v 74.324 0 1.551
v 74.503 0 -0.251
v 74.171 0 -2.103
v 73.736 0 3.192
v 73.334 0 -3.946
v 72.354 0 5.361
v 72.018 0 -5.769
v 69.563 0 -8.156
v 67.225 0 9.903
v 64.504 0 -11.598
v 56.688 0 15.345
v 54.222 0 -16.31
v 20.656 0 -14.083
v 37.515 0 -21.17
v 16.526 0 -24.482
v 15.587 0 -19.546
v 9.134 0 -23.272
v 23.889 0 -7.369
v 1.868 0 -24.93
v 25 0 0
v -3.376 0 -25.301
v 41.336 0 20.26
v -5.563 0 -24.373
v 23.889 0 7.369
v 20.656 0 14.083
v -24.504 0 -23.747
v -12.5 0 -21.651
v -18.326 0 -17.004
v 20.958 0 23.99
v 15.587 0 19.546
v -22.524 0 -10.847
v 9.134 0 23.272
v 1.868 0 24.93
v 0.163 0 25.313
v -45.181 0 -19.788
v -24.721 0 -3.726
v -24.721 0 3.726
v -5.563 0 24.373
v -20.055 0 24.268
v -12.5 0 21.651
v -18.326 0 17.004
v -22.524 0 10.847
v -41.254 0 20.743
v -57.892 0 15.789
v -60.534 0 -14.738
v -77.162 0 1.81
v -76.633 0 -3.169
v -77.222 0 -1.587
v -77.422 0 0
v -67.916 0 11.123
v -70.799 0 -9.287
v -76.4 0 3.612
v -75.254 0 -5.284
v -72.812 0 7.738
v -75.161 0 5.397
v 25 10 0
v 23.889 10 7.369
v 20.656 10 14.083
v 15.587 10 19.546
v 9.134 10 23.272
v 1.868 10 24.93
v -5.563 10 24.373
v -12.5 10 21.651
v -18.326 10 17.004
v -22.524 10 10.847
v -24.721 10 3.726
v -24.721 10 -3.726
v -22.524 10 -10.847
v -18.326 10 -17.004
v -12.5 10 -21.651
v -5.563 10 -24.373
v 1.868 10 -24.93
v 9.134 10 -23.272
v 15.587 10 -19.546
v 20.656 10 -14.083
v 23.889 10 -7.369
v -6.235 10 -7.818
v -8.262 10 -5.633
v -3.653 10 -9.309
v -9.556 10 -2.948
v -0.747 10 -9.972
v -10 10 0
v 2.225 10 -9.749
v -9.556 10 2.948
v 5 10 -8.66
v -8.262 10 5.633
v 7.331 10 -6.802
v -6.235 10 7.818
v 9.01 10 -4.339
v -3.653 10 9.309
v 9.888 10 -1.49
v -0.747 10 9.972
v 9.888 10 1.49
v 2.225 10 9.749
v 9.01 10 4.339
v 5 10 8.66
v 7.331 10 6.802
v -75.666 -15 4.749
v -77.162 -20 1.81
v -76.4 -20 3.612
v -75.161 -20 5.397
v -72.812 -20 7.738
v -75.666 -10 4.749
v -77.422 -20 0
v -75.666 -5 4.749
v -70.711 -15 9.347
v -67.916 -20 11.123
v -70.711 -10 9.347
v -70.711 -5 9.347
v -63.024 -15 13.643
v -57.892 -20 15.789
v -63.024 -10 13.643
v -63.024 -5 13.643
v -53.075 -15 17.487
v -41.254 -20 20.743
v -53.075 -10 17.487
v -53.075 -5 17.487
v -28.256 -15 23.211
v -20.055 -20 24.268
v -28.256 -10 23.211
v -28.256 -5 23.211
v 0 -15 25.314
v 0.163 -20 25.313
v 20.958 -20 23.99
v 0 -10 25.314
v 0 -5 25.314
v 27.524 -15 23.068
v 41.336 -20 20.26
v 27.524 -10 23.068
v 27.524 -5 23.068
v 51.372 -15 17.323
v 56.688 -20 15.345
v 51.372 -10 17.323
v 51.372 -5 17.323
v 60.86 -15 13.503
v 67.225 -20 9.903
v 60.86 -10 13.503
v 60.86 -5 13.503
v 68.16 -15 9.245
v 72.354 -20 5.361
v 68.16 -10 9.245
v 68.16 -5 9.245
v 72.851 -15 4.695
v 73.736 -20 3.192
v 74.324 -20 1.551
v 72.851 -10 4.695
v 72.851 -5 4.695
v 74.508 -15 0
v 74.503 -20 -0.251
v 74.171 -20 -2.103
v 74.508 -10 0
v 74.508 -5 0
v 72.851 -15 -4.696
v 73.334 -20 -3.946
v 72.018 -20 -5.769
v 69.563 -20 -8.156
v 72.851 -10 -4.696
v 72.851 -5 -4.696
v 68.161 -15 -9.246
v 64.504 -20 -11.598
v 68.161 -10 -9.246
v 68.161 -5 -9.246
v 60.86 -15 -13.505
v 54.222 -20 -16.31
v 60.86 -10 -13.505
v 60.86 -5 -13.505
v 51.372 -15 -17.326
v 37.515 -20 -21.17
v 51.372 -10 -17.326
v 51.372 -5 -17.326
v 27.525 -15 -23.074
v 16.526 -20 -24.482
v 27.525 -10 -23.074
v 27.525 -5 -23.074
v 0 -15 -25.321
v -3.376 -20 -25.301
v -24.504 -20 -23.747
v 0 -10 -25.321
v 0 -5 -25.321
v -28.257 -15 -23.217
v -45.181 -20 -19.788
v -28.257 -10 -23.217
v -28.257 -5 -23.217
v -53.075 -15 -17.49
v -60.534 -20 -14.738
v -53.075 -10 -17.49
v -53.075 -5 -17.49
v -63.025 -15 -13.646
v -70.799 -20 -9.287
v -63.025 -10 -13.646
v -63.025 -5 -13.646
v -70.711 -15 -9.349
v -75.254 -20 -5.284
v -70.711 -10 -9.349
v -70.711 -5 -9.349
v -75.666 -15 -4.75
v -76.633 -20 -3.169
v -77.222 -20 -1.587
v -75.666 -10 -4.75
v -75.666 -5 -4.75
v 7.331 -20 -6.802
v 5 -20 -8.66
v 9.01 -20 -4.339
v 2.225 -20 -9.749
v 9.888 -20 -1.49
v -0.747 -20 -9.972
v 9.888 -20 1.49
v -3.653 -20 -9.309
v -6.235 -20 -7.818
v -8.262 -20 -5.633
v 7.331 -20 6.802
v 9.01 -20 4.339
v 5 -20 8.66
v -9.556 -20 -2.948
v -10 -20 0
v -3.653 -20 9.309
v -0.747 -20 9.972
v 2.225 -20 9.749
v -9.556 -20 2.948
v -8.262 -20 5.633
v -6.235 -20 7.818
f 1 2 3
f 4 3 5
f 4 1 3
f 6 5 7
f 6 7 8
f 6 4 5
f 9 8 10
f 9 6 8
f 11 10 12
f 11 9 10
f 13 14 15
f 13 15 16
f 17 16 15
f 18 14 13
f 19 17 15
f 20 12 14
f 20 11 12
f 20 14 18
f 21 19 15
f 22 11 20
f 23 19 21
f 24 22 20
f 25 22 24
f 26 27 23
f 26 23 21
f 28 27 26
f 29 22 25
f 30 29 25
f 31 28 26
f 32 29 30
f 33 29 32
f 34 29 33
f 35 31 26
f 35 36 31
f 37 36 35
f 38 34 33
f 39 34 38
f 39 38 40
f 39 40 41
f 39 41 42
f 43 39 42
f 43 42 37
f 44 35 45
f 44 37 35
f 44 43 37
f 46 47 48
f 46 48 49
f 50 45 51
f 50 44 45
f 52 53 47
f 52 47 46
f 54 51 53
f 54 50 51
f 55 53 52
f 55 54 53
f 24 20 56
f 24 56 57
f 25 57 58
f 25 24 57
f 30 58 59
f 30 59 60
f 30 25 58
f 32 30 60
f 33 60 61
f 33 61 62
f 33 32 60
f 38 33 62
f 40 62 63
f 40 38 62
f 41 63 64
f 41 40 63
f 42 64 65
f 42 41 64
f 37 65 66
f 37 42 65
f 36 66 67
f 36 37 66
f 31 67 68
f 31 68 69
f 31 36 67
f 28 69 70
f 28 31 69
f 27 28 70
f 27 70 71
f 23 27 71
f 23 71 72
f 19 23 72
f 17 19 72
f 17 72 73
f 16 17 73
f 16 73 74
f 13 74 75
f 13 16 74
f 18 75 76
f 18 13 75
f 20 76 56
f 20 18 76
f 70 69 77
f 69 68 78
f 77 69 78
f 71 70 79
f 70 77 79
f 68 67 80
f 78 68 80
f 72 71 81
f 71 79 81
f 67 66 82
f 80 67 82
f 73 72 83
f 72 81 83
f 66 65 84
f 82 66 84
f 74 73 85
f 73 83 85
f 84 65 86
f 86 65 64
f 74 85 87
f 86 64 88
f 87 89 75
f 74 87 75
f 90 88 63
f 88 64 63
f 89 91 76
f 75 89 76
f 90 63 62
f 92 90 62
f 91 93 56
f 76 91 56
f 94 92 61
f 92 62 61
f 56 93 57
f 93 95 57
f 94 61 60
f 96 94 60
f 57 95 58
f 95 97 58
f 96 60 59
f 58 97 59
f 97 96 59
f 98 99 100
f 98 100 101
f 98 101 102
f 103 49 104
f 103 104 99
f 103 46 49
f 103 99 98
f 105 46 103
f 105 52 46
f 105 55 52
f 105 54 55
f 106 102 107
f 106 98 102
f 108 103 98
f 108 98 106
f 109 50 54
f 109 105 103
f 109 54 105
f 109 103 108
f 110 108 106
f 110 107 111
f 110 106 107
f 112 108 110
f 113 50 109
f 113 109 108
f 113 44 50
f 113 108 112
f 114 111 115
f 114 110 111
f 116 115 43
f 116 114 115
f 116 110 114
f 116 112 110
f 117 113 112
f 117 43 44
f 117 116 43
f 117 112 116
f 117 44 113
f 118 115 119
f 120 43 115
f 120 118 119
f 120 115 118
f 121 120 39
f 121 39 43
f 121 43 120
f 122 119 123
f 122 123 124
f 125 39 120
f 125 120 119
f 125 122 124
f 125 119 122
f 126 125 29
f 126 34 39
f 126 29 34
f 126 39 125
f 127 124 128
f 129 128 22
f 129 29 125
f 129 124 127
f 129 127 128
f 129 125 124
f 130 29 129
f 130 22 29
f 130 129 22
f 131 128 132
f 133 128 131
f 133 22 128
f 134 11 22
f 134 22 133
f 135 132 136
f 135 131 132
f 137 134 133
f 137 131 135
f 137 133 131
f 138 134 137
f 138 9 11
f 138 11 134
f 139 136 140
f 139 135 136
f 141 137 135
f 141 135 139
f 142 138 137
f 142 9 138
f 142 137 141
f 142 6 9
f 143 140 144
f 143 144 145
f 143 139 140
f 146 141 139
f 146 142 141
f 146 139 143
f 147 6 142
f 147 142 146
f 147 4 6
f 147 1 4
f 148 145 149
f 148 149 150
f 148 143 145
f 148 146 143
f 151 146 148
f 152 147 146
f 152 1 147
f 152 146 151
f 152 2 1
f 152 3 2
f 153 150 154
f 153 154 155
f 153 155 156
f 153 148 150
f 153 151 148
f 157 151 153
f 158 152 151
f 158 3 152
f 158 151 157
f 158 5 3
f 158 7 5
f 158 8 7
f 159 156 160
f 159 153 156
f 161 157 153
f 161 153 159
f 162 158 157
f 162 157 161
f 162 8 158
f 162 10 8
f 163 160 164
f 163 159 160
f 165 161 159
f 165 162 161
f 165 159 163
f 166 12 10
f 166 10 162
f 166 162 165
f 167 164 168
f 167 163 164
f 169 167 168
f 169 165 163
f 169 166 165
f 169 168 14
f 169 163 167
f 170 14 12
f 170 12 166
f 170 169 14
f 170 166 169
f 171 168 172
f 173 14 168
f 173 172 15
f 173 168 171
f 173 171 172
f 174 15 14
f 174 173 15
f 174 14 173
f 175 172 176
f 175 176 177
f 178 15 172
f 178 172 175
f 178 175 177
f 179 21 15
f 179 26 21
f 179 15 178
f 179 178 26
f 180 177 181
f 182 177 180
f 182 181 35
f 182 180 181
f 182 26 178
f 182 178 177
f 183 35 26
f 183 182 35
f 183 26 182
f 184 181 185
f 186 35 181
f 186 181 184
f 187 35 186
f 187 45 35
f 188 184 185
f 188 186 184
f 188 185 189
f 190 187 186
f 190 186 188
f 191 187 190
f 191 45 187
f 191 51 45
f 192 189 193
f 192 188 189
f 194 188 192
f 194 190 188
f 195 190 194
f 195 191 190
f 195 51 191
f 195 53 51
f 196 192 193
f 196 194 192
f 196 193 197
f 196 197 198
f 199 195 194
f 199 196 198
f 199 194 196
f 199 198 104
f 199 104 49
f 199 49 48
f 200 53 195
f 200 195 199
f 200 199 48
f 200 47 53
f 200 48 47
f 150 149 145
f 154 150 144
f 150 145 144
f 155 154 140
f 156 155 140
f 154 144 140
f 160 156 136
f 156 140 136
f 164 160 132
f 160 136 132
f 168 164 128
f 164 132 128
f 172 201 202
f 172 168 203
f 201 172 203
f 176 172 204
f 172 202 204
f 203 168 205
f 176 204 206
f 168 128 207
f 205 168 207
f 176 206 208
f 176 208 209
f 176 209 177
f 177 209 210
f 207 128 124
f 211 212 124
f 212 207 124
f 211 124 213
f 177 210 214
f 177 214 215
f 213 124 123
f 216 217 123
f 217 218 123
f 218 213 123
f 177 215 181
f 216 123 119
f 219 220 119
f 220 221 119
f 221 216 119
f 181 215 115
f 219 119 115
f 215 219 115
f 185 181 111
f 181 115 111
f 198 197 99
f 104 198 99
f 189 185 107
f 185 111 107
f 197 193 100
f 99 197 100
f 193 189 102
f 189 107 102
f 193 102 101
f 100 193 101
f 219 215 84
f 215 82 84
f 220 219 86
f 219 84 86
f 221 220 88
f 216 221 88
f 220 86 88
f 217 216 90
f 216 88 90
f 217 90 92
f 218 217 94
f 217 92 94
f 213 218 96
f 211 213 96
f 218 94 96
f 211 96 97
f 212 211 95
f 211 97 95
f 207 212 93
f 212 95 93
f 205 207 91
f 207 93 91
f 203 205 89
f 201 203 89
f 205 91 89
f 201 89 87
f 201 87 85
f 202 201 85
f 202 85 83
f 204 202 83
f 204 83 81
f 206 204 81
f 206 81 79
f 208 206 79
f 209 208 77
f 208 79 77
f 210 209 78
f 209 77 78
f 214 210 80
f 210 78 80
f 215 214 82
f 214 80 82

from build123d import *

# Parameters (mm, degrees)
F0_R     = 25
F1_DEPTH = 10
F2_R     = 15
F3_DEPTH = 10
F5_DEPTH = 20
F6_R     = 10
F7_DEPTH = 25


with BuildPart() as f1:
    # F0 (on Front) → F1 (new body, symmetric)
    with BuildSketch(Plane.XZ):
        Circle(F0_R)
    extrude(amount=F1_DEPTH, both=True)

    # F2 (on Front) → F3 (cut, through all)
    with BuildSketch(Plane.XZ):
        Circle(F2_R)
    extrude(amount=F3_DEPTH, mode=Mode.SUBTRACT)

    # F4 (on Front) → F5 (join)
    with BuildSketch(Plane.XZ):
        with BuildLine():
            add(Edge.make_bspline(
                [(-77.4218812204, 0), (-77.4215213056, 12.7321060804), (0.1456770976, 37.9714820309), (111.3686131507, 0.0032495259), (0.1457296307, -37.9859056359), (-77.4222411402, -12.732283472), (-77.4218812204, 0)],
                knots=[0, 0, 0, 0, 0.2521558752, 0.4999963934, 0.7478406116, 1, 1, 1, 1], degree=3))
        make_face()
    extrude(amount=F5_DEPTH)

    # F6 (on face) → F7 (cut, symmetric)
    with BuildSketch(Plane(origin=(0, 0, 0), x_dir=(-1, 0, 0), z_dir=(0, 1, 0))):
        Circle(F6_R)
    extrude(amount=F7_DEPTH, both=True, mode=Mode.SUBTRACT)


solid = f1.part
